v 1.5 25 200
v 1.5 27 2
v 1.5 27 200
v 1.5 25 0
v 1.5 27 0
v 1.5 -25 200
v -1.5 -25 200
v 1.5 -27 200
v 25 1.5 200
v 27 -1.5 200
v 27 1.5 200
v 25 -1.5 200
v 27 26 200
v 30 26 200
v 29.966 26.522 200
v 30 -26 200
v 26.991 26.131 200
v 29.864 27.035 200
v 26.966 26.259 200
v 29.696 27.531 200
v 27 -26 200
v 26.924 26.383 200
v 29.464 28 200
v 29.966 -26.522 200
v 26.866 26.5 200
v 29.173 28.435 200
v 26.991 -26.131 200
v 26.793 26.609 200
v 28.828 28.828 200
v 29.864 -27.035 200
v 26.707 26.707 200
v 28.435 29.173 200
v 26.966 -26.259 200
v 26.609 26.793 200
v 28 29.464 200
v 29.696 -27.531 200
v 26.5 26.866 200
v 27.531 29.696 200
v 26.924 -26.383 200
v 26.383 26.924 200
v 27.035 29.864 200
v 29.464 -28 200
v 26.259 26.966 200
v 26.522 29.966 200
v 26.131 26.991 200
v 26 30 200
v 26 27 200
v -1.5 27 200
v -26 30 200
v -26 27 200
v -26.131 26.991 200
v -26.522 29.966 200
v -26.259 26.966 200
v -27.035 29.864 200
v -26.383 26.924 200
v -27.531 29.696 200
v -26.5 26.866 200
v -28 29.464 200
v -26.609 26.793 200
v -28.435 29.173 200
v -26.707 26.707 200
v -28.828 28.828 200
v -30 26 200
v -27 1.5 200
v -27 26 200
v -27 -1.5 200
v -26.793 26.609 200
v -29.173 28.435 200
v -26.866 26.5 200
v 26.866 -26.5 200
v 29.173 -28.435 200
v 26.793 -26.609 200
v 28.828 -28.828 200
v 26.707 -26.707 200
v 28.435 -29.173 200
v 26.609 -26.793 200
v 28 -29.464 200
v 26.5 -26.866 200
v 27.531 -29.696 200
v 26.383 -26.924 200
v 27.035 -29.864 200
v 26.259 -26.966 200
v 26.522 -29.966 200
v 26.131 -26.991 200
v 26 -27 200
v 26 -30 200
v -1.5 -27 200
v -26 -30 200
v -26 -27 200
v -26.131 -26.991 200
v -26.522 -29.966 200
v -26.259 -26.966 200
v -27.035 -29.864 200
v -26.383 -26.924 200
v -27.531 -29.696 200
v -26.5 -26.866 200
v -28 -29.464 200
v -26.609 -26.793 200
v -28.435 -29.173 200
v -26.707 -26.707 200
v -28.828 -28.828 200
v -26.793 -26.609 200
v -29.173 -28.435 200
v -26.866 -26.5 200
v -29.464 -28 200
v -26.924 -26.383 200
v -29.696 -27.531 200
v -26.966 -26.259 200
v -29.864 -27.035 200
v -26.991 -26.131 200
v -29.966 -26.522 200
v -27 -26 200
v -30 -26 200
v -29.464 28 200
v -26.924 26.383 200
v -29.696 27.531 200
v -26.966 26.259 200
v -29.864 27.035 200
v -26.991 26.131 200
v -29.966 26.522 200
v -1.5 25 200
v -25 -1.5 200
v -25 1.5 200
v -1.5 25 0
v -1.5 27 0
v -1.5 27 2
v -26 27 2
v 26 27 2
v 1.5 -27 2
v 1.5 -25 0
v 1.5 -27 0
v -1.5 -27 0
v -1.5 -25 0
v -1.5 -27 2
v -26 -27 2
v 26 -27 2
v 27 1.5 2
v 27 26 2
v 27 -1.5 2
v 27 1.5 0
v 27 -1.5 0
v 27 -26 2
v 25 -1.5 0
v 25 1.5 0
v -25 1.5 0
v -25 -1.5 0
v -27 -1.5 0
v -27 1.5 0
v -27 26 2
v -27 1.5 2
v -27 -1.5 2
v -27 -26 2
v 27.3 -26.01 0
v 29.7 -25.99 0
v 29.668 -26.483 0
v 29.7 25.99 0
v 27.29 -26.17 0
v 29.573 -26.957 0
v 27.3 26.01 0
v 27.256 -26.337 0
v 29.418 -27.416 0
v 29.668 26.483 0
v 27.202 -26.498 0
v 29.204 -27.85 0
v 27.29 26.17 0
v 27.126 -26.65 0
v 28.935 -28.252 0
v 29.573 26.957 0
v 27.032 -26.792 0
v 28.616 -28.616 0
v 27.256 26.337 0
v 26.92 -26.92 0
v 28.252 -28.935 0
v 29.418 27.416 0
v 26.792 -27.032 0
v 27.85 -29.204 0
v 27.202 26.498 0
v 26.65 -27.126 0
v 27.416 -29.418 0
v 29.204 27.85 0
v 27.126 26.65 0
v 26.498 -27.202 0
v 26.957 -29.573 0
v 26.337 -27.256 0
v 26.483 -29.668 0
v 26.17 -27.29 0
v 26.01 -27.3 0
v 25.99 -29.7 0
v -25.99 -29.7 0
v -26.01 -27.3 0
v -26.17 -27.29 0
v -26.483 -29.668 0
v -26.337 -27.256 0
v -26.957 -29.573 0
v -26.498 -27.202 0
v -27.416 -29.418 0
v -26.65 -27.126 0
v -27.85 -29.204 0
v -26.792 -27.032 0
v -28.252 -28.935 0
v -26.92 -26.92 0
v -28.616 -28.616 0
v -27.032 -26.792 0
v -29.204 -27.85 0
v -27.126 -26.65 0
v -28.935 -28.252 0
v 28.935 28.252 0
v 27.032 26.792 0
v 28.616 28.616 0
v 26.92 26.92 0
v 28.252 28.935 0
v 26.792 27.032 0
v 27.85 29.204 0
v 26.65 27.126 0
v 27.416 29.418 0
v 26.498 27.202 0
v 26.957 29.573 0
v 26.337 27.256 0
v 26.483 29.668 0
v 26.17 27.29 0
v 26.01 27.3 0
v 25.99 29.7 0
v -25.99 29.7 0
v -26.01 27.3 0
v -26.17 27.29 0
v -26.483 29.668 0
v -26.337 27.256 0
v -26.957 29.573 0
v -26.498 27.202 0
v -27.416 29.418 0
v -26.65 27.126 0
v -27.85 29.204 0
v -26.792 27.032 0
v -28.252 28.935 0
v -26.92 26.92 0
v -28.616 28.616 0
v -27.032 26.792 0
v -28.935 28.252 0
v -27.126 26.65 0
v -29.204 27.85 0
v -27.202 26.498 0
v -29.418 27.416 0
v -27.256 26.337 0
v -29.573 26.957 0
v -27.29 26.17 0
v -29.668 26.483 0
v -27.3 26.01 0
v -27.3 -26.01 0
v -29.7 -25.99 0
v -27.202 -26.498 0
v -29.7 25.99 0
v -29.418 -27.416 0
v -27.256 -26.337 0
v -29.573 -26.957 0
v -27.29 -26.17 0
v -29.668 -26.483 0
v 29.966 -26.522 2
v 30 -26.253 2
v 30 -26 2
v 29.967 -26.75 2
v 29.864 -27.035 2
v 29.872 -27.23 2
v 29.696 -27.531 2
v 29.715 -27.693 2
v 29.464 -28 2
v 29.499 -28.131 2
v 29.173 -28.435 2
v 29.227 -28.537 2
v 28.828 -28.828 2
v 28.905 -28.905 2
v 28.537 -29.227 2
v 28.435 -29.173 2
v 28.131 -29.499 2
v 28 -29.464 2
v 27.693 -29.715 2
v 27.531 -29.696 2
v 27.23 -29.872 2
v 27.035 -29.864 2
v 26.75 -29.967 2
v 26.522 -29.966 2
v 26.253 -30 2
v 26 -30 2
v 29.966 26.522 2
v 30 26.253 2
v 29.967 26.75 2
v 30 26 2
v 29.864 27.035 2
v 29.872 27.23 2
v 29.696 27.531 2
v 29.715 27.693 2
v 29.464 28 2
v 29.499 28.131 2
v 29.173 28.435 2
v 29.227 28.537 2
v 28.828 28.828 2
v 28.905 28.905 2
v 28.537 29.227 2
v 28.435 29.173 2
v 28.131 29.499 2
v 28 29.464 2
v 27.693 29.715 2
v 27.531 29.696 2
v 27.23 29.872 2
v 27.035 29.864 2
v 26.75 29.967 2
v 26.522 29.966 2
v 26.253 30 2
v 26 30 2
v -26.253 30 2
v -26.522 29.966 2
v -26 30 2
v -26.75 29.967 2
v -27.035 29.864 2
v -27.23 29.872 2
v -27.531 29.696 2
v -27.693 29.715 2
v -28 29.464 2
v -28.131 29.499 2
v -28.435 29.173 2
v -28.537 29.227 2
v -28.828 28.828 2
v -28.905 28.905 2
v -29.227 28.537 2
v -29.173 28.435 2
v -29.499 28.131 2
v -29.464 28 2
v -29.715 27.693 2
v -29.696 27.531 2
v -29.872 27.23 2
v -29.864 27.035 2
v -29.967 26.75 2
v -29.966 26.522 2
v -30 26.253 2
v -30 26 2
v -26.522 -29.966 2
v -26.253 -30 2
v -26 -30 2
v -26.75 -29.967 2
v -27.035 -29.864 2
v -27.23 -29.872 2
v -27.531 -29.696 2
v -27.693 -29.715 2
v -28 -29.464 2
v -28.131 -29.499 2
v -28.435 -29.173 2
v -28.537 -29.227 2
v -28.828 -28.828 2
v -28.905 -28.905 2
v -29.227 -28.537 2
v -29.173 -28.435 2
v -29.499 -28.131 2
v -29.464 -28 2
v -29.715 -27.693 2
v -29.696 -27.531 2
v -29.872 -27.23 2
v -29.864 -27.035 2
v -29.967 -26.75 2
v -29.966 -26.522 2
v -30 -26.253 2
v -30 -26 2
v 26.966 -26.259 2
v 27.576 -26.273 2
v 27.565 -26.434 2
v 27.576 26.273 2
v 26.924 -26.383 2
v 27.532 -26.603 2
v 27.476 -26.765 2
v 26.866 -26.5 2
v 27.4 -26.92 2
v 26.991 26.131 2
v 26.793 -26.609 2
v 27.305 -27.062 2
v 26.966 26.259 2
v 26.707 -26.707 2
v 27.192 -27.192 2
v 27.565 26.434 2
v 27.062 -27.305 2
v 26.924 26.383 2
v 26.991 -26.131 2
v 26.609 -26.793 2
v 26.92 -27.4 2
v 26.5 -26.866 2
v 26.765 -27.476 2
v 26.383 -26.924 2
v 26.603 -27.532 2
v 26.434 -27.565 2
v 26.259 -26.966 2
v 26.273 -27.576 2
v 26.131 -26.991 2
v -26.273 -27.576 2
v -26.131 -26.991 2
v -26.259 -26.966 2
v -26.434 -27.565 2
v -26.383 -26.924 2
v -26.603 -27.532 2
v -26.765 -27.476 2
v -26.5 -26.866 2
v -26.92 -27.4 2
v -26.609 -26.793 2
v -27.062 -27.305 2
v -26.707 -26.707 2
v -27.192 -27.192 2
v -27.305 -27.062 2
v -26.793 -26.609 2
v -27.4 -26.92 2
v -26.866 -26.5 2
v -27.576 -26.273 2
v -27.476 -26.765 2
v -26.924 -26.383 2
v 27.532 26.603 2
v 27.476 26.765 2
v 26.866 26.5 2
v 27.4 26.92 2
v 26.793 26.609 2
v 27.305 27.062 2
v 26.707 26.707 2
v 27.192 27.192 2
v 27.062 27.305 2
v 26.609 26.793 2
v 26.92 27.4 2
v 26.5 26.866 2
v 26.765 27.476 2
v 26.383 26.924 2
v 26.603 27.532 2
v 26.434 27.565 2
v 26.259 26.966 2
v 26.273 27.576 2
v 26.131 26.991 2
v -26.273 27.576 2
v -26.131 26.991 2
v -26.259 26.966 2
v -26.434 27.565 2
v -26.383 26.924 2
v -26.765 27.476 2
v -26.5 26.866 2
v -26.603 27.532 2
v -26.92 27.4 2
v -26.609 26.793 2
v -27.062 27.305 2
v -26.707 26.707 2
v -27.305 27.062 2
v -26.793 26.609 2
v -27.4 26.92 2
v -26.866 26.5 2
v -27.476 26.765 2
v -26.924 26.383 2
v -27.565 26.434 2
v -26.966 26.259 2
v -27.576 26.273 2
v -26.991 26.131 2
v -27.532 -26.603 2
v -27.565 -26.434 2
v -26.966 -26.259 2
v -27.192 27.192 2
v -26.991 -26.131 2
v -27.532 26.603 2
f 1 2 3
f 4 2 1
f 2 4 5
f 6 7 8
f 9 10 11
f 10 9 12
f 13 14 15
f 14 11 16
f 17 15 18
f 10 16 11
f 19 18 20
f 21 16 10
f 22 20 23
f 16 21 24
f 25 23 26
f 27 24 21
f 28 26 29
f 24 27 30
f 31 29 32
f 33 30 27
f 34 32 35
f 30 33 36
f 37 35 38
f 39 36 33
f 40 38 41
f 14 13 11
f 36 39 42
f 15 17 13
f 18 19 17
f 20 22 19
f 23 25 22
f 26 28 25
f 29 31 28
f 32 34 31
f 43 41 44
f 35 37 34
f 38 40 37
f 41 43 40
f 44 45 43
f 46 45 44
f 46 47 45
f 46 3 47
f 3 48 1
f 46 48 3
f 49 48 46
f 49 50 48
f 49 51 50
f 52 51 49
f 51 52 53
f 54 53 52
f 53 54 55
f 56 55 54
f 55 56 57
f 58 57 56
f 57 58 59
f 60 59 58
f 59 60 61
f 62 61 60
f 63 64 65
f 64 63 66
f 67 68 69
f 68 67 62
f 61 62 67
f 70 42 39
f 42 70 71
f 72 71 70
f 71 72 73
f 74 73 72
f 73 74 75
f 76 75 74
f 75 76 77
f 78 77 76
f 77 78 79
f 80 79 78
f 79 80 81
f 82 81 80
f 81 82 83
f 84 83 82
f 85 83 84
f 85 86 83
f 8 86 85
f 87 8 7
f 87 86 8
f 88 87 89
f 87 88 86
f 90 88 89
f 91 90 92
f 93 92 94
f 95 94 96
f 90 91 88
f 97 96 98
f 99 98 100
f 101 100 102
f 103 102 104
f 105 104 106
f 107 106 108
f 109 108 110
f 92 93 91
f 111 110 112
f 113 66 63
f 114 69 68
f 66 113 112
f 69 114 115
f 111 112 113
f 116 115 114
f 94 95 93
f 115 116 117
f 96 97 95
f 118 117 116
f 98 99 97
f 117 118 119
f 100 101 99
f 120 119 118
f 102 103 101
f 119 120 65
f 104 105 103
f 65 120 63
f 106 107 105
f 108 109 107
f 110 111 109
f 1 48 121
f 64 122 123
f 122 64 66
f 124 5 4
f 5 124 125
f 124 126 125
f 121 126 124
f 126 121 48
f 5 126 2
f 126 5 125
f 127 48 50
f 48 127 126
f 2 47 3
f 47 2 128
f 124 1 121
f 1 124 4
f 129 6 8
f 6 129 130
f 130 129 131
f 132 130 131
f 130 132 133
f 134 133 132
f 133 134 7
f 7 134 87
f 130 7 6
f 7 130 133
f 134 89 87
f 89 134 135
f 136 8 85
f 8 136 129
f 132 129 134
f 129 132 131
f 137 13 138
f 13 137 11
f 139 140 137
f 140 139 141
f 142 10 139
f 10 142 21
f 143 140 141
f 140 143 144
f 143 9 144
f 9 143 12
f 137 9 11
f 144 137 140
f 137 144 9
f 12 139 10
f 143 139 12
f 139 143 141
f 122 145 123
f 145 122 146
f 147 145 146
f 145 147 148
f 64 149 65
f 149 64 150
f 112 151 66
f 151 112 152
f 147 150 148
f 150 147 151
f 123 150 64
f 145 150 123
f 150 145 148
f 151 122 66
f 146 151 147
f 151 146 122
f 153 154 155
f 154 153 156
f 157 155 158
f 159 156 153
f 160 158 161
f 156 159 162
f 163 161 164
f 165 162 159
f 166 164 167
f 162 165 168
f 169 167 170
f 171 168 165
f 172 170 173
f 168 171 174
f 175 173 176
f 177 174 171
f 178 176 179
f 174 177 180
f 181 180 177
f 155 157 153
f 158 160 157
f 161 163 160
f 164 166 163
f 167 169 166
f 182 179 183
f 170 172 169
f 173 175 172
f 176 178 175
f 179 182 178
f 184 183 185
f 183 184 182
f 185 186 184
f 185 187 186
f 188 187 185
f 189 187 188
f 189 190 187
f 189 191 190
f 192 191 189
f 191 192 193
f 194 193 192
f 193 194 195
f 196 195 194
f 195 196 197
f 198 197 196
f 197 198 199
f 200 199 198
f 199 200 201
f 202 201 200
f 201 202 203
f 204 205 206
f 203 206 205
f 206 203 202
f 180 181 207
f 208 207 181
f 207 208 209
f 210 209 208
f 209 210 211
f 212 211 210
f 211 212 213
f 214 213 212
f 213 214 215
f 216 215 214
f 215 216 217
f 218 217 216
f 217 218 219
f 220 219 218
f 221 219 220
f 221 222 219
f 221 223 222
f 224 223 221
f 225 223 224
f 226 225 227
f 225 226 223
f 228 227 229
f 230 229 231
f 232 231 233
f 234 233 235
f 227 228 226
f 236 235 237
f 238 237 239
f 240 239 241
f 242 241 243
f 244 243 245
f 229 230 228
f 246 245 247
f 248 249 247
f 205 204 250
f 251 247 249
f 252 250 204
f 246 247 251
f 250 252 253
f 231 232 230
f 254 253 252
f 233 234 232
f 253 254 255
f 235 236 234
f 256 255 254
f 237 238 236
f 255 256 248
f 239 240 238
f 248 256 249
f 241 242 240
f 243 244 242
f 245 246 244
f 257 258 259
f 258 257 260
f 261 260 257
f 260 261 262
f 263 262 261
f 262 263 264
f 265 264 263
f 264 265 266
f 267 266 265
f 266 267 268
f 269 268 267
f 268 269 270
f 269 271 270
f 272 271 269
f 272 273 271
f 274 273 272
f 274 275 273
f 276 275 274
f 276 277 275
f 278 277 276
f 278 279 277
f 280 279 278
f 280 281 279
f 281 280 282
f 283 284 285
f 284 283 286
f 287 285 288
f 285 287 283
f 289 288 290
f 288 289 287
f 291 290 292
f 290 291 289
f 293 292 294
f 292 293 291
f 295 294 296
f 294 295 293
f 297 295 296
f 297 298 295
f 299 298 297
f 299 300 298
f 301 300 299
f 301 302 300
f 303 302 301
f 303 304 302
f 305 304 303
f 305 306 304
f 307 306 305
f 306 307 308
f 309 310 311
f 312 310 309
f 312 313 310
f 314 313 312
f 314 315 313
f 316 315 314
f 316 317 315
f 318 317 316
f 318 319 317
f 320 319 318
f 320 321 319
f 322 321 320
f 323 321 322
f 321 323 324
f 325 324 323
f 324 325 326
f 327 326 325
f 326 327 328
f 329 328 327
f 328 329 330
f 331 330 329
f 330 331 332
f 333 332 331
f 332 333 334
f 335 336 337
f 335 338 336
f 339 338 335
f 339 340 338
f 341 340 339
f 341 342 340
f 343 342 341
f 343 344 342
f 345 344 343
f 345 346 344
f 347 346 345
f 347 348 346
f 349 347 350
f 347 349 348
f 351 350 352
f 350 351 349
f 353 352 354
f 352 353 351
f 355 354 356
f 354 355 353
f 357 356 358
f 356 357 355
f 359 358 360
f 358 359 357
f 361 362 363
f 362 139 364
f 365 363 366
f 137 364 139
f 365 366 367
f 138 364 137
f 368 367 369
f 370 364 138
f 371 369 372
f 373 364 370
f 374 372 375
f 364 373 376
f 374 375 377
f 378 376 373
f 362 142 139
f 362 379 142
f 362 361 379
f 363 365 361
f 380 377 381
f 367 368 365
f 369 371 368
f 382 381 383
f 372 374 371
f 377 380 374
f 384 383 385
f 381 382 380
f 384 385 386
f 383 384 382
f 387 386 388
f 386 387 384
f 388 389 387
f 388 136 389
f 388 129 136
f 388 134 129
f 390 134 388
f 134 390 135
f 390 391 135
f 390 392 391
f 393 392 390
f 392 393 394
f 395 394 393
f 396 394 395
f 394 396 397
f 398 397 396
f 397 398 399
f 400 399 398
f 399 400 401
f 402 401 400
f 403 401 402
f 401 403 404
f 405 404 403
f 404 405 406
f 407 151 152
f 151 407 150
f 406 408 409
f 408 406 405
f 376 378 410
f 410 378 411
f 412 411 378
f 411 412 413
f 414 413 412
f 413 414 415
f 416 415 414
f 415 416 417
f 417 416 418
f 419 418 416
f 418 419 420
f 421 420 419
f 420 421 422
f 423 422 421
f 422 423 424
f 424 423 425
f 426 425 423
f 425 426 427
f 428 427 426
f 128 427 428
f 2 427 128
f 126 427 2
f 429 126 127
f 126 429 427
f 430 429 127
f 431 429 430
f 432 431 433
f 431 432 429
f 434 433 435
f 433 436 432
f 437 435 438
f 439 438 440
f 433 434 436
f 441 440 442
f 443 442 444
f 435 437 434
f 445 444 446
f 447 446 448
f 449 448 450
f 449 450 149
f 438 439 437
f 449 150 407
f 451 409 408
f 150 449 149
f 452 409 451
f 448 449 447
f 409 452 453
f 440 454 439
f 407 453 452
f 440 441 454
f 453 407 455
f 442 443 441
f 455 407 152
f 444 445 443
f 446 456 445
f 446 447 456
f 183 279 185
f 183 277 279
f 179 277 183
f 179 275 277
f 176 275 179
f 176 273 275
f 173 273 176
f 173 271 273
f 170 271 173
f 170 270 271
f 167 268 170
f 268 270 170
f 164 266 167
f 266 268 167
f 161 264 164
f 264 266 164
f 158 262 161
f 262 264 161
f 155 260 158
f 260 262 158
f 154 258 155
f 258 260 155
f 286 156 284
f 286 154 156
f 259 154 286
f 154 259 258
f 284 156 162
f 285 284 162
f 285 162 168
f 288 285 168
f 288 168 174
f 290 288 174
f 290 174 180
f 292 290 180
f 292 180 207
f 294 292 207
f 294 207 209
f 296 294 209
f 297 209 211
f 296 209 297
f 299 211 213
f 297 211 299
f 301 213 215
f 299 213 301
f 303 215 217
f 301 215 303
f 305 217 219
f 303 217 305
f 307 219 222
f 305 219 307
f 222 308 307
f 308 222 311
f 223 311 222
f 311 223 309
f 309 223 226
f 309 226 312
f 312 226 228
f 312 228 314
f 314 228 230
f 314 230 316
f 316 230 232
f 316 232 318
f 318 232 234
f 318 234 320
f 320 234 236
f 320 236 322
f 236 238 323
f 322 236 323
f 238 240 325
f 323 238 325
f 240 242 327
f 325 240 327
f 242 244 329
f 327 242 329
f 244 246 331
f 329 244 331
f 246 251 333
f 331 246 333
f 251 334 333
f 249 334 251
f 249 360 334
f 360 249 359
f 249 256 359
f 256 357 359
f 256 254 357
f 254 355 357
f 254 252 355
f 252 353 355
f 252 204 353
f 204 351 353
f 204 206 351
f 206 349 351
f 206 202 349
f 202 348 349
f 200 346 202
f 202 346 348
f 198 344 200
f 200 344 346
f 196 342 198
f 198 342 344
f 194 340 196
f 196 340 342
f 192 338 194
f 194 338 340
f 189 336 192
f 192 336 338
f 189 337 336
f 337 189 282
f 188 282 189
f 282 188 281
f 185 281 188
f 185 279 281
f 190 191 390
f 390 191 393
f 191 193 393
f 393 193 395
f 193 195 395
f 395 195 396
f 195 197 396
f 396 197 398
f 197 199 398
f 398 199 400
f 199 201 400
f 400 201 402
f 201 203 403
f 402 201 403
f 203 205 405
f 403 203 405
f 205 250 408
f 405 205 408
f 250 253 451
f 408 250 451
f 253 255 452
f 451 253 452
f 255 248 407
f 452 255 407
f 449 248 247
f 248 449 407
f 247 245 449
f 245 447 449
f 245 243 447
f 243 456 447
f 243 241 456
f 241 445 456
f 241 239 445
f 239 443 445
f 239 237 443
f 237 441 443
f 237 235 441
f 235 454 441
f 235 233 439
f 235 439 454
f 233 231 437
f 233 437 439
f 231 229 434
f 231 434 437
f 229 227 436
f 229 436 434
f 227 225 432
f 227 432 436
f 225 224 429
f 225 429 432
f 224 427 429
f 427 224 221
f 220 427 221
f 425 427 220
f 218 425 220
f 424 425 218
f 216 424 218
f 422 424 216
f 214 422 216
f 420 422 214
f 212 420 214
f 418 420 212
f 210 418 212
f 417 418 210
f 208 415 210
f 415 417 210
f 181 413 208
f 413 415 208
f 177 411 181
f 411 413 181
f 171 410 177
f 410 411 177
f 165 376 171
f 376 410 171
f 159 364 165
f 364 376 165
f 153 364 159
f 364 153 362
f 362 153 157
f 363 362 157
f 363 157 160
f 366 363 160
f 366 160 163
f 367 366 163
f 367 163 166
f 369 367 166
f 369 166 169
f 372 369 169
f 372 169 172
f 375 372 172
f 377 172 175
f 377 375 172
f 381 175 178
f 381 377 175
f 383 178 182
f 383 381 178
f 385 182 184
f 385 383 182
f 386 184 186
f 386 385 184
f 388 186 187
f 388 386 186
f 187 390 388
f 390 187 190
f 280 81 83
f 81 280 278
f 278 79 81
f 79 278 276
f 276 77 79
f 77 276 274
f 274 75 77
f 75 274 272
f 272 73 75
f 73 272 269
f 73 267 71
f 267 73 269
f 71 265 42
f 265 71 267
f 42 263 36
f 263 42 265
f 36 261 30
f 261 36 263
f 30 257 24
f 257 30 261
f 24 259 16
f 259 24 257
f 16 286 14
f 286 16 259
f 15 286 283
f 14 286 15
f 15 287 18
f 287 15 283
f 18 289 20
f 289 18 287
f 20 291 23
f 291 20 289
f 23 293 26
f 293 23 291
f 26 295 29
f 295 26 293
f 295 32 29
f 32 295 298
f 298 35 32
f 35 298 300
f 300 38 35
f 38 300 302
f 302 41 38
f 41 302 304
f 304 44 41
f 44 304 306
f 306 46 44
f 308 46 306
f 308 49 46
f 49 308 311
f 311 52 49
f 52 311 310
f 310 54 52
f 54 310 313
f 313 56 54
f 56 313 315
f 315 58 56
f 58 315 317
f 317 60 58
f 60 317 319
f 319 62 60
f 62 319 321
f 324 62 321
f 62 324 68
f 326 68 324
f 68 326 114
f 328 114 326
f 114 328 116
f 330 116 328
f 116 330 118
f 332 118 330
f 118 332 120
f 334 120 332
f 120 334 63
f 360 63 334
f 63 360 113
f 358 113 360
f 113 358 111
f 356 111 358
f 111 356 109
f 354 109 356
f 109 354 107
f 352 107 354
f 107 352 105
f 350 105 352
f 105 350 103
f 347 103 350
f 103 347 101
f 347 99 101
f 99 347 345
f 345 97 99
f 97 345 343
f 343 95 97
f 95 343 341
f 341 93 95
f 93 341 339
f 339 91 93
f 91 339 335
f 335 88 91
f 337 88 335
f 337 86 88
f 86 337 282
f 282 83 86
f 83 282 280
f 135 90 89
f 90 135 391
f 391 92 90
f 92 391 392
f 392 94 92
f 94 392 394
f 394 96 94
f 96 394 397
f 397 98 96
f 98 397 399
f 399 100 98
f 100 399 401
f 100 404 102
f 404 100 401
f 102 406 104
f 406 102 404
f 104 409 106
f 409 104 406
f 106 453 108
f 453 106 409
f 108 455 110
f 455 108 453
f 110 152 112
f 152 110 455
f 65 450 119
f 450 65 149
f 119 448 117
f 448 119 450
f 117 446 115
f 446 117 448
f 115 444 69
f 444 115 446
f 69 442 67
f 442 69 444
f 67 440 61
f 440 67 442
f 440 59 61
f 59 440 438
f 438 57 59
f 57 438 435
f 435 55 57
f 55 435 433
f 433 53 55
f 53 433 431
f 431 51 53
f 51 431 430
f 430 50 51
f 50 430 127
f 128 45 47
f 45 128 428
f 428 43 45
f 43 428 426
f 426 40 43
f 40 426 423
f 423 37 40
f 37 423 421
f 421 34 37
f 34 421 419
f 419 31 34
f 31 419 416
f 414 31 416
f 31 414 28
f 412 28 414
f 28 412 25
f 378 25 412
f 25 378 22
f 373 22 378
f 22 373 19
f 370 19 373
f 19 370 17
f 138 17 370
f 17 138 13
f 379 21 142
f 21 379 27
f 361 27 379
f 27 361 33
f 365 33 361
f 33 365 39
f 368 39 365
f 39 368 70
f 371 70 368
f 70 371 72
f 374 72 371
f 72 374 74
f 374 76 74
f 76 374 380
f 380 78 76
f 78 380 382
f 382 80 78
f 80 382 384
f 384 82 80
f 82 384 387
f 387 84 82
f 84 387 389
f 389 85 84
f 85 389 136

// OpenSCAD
/*
  JARVIS Maker Lab
  Vision Tower V1 - Tower Column

  Print orientation: upright, as modeled
  Material target: ASA
  Printer target: Bambu A1
  Supports: none

  Default output is the full 200 mm column.
  Change render_mode to "fit_test" for a short 30 mm coupon.
*/

$fn = 48;

// ---------- User parameters ----------
render_mode = "column";   // "column" or "fit_test"

column_outer = 60;        // outside width/depth, mm
wall_thickness = 3;       // primary wall thickness, mm
column_height = 200;      // full column height, mm
fit_test_height = 30;     // short validation coupon, mm

corner_radius = 4;        // outside corner radius, mm
inside_corner_radius = 1; // inside corner radius, mm

rib_depth = 2.0;          // internal stiffening rib projection, mm
rib_width = 3.0;          // internal stiffening rib width, mm

lead_in_height = 2.0;     // insertion chamfer height, mm
lead_in_reduction = 0.6;  // total width reduction at bottom, mm

// ---------- Derived values ----------
inner_size = column_outer - 2 * wall_thickness;
active_height = render_mode == "fit_test" ? fit_test_height : column_height;

assert(column_outer > 2 * wall_thickness,
       "column_outer must be larger than twice wall_thickness");
assert(corner_radius > wall_thickness,
       "corner_radius must be greater than wall_thickness");
assert(active_height > lead_in_height,
       "active height must exceed lead-in height");

// ---------- Helpers ----------
module rounded_square(size, radius) {
    offset(r = radius)
        square([size - 2 * radius, size - 2 * radius], center = true);
}

module rounded_square_tube_2d() {
    difference() {
        rounded_square(column_outer, corner_radius);
        rounded_square(inner_size, inside_corner_radius);
    }
}

module vertical_ribs(height) {
    // Four shallow ribs centered on the inside faces.
    // They increase stiffness while keeping the center open for cabling.
    inner_half = inner_size / 2;

    translate([0,  inner_half - rib_depth / 2, height / 2])
        cube([rib_width, rib_depth, height], center = true);

    translate([0, -inner_half + rib_depth / 2, height / 2])
        cube([rib_width, rib_depth, height], center = true);

    translate([ inner_half - rib_depth / 2, 0, height / 2])
        cube([rib_depth, rib_width, height], center = true);

    translate([-inner_half + rib_depth / 2, 0, height / 2])
        cube([rib_depth, rib_width, height], center = true);
}

module lead_in_section() {
    // Slightly reduced lower edge to help the column enter the base receiver.
    linear_extrude(
        height = lead_in_height,
        scale = column_outer / (column_outer - lead_in_reduction)
    )
        offset(delta = -lead_in_reduction / 2)
            rounded_square_tube_2d();
}

module main_column(height) {
    union() {
        lead_in_section();

        translate([0, 0, lead_in_height])
            linear_extrude(height = height - lead_in_height)
                rounded_square_tube_2d();

        vertical_ribs(height);
    }
}

// ---------- Output ----------
main_column(active_height);
